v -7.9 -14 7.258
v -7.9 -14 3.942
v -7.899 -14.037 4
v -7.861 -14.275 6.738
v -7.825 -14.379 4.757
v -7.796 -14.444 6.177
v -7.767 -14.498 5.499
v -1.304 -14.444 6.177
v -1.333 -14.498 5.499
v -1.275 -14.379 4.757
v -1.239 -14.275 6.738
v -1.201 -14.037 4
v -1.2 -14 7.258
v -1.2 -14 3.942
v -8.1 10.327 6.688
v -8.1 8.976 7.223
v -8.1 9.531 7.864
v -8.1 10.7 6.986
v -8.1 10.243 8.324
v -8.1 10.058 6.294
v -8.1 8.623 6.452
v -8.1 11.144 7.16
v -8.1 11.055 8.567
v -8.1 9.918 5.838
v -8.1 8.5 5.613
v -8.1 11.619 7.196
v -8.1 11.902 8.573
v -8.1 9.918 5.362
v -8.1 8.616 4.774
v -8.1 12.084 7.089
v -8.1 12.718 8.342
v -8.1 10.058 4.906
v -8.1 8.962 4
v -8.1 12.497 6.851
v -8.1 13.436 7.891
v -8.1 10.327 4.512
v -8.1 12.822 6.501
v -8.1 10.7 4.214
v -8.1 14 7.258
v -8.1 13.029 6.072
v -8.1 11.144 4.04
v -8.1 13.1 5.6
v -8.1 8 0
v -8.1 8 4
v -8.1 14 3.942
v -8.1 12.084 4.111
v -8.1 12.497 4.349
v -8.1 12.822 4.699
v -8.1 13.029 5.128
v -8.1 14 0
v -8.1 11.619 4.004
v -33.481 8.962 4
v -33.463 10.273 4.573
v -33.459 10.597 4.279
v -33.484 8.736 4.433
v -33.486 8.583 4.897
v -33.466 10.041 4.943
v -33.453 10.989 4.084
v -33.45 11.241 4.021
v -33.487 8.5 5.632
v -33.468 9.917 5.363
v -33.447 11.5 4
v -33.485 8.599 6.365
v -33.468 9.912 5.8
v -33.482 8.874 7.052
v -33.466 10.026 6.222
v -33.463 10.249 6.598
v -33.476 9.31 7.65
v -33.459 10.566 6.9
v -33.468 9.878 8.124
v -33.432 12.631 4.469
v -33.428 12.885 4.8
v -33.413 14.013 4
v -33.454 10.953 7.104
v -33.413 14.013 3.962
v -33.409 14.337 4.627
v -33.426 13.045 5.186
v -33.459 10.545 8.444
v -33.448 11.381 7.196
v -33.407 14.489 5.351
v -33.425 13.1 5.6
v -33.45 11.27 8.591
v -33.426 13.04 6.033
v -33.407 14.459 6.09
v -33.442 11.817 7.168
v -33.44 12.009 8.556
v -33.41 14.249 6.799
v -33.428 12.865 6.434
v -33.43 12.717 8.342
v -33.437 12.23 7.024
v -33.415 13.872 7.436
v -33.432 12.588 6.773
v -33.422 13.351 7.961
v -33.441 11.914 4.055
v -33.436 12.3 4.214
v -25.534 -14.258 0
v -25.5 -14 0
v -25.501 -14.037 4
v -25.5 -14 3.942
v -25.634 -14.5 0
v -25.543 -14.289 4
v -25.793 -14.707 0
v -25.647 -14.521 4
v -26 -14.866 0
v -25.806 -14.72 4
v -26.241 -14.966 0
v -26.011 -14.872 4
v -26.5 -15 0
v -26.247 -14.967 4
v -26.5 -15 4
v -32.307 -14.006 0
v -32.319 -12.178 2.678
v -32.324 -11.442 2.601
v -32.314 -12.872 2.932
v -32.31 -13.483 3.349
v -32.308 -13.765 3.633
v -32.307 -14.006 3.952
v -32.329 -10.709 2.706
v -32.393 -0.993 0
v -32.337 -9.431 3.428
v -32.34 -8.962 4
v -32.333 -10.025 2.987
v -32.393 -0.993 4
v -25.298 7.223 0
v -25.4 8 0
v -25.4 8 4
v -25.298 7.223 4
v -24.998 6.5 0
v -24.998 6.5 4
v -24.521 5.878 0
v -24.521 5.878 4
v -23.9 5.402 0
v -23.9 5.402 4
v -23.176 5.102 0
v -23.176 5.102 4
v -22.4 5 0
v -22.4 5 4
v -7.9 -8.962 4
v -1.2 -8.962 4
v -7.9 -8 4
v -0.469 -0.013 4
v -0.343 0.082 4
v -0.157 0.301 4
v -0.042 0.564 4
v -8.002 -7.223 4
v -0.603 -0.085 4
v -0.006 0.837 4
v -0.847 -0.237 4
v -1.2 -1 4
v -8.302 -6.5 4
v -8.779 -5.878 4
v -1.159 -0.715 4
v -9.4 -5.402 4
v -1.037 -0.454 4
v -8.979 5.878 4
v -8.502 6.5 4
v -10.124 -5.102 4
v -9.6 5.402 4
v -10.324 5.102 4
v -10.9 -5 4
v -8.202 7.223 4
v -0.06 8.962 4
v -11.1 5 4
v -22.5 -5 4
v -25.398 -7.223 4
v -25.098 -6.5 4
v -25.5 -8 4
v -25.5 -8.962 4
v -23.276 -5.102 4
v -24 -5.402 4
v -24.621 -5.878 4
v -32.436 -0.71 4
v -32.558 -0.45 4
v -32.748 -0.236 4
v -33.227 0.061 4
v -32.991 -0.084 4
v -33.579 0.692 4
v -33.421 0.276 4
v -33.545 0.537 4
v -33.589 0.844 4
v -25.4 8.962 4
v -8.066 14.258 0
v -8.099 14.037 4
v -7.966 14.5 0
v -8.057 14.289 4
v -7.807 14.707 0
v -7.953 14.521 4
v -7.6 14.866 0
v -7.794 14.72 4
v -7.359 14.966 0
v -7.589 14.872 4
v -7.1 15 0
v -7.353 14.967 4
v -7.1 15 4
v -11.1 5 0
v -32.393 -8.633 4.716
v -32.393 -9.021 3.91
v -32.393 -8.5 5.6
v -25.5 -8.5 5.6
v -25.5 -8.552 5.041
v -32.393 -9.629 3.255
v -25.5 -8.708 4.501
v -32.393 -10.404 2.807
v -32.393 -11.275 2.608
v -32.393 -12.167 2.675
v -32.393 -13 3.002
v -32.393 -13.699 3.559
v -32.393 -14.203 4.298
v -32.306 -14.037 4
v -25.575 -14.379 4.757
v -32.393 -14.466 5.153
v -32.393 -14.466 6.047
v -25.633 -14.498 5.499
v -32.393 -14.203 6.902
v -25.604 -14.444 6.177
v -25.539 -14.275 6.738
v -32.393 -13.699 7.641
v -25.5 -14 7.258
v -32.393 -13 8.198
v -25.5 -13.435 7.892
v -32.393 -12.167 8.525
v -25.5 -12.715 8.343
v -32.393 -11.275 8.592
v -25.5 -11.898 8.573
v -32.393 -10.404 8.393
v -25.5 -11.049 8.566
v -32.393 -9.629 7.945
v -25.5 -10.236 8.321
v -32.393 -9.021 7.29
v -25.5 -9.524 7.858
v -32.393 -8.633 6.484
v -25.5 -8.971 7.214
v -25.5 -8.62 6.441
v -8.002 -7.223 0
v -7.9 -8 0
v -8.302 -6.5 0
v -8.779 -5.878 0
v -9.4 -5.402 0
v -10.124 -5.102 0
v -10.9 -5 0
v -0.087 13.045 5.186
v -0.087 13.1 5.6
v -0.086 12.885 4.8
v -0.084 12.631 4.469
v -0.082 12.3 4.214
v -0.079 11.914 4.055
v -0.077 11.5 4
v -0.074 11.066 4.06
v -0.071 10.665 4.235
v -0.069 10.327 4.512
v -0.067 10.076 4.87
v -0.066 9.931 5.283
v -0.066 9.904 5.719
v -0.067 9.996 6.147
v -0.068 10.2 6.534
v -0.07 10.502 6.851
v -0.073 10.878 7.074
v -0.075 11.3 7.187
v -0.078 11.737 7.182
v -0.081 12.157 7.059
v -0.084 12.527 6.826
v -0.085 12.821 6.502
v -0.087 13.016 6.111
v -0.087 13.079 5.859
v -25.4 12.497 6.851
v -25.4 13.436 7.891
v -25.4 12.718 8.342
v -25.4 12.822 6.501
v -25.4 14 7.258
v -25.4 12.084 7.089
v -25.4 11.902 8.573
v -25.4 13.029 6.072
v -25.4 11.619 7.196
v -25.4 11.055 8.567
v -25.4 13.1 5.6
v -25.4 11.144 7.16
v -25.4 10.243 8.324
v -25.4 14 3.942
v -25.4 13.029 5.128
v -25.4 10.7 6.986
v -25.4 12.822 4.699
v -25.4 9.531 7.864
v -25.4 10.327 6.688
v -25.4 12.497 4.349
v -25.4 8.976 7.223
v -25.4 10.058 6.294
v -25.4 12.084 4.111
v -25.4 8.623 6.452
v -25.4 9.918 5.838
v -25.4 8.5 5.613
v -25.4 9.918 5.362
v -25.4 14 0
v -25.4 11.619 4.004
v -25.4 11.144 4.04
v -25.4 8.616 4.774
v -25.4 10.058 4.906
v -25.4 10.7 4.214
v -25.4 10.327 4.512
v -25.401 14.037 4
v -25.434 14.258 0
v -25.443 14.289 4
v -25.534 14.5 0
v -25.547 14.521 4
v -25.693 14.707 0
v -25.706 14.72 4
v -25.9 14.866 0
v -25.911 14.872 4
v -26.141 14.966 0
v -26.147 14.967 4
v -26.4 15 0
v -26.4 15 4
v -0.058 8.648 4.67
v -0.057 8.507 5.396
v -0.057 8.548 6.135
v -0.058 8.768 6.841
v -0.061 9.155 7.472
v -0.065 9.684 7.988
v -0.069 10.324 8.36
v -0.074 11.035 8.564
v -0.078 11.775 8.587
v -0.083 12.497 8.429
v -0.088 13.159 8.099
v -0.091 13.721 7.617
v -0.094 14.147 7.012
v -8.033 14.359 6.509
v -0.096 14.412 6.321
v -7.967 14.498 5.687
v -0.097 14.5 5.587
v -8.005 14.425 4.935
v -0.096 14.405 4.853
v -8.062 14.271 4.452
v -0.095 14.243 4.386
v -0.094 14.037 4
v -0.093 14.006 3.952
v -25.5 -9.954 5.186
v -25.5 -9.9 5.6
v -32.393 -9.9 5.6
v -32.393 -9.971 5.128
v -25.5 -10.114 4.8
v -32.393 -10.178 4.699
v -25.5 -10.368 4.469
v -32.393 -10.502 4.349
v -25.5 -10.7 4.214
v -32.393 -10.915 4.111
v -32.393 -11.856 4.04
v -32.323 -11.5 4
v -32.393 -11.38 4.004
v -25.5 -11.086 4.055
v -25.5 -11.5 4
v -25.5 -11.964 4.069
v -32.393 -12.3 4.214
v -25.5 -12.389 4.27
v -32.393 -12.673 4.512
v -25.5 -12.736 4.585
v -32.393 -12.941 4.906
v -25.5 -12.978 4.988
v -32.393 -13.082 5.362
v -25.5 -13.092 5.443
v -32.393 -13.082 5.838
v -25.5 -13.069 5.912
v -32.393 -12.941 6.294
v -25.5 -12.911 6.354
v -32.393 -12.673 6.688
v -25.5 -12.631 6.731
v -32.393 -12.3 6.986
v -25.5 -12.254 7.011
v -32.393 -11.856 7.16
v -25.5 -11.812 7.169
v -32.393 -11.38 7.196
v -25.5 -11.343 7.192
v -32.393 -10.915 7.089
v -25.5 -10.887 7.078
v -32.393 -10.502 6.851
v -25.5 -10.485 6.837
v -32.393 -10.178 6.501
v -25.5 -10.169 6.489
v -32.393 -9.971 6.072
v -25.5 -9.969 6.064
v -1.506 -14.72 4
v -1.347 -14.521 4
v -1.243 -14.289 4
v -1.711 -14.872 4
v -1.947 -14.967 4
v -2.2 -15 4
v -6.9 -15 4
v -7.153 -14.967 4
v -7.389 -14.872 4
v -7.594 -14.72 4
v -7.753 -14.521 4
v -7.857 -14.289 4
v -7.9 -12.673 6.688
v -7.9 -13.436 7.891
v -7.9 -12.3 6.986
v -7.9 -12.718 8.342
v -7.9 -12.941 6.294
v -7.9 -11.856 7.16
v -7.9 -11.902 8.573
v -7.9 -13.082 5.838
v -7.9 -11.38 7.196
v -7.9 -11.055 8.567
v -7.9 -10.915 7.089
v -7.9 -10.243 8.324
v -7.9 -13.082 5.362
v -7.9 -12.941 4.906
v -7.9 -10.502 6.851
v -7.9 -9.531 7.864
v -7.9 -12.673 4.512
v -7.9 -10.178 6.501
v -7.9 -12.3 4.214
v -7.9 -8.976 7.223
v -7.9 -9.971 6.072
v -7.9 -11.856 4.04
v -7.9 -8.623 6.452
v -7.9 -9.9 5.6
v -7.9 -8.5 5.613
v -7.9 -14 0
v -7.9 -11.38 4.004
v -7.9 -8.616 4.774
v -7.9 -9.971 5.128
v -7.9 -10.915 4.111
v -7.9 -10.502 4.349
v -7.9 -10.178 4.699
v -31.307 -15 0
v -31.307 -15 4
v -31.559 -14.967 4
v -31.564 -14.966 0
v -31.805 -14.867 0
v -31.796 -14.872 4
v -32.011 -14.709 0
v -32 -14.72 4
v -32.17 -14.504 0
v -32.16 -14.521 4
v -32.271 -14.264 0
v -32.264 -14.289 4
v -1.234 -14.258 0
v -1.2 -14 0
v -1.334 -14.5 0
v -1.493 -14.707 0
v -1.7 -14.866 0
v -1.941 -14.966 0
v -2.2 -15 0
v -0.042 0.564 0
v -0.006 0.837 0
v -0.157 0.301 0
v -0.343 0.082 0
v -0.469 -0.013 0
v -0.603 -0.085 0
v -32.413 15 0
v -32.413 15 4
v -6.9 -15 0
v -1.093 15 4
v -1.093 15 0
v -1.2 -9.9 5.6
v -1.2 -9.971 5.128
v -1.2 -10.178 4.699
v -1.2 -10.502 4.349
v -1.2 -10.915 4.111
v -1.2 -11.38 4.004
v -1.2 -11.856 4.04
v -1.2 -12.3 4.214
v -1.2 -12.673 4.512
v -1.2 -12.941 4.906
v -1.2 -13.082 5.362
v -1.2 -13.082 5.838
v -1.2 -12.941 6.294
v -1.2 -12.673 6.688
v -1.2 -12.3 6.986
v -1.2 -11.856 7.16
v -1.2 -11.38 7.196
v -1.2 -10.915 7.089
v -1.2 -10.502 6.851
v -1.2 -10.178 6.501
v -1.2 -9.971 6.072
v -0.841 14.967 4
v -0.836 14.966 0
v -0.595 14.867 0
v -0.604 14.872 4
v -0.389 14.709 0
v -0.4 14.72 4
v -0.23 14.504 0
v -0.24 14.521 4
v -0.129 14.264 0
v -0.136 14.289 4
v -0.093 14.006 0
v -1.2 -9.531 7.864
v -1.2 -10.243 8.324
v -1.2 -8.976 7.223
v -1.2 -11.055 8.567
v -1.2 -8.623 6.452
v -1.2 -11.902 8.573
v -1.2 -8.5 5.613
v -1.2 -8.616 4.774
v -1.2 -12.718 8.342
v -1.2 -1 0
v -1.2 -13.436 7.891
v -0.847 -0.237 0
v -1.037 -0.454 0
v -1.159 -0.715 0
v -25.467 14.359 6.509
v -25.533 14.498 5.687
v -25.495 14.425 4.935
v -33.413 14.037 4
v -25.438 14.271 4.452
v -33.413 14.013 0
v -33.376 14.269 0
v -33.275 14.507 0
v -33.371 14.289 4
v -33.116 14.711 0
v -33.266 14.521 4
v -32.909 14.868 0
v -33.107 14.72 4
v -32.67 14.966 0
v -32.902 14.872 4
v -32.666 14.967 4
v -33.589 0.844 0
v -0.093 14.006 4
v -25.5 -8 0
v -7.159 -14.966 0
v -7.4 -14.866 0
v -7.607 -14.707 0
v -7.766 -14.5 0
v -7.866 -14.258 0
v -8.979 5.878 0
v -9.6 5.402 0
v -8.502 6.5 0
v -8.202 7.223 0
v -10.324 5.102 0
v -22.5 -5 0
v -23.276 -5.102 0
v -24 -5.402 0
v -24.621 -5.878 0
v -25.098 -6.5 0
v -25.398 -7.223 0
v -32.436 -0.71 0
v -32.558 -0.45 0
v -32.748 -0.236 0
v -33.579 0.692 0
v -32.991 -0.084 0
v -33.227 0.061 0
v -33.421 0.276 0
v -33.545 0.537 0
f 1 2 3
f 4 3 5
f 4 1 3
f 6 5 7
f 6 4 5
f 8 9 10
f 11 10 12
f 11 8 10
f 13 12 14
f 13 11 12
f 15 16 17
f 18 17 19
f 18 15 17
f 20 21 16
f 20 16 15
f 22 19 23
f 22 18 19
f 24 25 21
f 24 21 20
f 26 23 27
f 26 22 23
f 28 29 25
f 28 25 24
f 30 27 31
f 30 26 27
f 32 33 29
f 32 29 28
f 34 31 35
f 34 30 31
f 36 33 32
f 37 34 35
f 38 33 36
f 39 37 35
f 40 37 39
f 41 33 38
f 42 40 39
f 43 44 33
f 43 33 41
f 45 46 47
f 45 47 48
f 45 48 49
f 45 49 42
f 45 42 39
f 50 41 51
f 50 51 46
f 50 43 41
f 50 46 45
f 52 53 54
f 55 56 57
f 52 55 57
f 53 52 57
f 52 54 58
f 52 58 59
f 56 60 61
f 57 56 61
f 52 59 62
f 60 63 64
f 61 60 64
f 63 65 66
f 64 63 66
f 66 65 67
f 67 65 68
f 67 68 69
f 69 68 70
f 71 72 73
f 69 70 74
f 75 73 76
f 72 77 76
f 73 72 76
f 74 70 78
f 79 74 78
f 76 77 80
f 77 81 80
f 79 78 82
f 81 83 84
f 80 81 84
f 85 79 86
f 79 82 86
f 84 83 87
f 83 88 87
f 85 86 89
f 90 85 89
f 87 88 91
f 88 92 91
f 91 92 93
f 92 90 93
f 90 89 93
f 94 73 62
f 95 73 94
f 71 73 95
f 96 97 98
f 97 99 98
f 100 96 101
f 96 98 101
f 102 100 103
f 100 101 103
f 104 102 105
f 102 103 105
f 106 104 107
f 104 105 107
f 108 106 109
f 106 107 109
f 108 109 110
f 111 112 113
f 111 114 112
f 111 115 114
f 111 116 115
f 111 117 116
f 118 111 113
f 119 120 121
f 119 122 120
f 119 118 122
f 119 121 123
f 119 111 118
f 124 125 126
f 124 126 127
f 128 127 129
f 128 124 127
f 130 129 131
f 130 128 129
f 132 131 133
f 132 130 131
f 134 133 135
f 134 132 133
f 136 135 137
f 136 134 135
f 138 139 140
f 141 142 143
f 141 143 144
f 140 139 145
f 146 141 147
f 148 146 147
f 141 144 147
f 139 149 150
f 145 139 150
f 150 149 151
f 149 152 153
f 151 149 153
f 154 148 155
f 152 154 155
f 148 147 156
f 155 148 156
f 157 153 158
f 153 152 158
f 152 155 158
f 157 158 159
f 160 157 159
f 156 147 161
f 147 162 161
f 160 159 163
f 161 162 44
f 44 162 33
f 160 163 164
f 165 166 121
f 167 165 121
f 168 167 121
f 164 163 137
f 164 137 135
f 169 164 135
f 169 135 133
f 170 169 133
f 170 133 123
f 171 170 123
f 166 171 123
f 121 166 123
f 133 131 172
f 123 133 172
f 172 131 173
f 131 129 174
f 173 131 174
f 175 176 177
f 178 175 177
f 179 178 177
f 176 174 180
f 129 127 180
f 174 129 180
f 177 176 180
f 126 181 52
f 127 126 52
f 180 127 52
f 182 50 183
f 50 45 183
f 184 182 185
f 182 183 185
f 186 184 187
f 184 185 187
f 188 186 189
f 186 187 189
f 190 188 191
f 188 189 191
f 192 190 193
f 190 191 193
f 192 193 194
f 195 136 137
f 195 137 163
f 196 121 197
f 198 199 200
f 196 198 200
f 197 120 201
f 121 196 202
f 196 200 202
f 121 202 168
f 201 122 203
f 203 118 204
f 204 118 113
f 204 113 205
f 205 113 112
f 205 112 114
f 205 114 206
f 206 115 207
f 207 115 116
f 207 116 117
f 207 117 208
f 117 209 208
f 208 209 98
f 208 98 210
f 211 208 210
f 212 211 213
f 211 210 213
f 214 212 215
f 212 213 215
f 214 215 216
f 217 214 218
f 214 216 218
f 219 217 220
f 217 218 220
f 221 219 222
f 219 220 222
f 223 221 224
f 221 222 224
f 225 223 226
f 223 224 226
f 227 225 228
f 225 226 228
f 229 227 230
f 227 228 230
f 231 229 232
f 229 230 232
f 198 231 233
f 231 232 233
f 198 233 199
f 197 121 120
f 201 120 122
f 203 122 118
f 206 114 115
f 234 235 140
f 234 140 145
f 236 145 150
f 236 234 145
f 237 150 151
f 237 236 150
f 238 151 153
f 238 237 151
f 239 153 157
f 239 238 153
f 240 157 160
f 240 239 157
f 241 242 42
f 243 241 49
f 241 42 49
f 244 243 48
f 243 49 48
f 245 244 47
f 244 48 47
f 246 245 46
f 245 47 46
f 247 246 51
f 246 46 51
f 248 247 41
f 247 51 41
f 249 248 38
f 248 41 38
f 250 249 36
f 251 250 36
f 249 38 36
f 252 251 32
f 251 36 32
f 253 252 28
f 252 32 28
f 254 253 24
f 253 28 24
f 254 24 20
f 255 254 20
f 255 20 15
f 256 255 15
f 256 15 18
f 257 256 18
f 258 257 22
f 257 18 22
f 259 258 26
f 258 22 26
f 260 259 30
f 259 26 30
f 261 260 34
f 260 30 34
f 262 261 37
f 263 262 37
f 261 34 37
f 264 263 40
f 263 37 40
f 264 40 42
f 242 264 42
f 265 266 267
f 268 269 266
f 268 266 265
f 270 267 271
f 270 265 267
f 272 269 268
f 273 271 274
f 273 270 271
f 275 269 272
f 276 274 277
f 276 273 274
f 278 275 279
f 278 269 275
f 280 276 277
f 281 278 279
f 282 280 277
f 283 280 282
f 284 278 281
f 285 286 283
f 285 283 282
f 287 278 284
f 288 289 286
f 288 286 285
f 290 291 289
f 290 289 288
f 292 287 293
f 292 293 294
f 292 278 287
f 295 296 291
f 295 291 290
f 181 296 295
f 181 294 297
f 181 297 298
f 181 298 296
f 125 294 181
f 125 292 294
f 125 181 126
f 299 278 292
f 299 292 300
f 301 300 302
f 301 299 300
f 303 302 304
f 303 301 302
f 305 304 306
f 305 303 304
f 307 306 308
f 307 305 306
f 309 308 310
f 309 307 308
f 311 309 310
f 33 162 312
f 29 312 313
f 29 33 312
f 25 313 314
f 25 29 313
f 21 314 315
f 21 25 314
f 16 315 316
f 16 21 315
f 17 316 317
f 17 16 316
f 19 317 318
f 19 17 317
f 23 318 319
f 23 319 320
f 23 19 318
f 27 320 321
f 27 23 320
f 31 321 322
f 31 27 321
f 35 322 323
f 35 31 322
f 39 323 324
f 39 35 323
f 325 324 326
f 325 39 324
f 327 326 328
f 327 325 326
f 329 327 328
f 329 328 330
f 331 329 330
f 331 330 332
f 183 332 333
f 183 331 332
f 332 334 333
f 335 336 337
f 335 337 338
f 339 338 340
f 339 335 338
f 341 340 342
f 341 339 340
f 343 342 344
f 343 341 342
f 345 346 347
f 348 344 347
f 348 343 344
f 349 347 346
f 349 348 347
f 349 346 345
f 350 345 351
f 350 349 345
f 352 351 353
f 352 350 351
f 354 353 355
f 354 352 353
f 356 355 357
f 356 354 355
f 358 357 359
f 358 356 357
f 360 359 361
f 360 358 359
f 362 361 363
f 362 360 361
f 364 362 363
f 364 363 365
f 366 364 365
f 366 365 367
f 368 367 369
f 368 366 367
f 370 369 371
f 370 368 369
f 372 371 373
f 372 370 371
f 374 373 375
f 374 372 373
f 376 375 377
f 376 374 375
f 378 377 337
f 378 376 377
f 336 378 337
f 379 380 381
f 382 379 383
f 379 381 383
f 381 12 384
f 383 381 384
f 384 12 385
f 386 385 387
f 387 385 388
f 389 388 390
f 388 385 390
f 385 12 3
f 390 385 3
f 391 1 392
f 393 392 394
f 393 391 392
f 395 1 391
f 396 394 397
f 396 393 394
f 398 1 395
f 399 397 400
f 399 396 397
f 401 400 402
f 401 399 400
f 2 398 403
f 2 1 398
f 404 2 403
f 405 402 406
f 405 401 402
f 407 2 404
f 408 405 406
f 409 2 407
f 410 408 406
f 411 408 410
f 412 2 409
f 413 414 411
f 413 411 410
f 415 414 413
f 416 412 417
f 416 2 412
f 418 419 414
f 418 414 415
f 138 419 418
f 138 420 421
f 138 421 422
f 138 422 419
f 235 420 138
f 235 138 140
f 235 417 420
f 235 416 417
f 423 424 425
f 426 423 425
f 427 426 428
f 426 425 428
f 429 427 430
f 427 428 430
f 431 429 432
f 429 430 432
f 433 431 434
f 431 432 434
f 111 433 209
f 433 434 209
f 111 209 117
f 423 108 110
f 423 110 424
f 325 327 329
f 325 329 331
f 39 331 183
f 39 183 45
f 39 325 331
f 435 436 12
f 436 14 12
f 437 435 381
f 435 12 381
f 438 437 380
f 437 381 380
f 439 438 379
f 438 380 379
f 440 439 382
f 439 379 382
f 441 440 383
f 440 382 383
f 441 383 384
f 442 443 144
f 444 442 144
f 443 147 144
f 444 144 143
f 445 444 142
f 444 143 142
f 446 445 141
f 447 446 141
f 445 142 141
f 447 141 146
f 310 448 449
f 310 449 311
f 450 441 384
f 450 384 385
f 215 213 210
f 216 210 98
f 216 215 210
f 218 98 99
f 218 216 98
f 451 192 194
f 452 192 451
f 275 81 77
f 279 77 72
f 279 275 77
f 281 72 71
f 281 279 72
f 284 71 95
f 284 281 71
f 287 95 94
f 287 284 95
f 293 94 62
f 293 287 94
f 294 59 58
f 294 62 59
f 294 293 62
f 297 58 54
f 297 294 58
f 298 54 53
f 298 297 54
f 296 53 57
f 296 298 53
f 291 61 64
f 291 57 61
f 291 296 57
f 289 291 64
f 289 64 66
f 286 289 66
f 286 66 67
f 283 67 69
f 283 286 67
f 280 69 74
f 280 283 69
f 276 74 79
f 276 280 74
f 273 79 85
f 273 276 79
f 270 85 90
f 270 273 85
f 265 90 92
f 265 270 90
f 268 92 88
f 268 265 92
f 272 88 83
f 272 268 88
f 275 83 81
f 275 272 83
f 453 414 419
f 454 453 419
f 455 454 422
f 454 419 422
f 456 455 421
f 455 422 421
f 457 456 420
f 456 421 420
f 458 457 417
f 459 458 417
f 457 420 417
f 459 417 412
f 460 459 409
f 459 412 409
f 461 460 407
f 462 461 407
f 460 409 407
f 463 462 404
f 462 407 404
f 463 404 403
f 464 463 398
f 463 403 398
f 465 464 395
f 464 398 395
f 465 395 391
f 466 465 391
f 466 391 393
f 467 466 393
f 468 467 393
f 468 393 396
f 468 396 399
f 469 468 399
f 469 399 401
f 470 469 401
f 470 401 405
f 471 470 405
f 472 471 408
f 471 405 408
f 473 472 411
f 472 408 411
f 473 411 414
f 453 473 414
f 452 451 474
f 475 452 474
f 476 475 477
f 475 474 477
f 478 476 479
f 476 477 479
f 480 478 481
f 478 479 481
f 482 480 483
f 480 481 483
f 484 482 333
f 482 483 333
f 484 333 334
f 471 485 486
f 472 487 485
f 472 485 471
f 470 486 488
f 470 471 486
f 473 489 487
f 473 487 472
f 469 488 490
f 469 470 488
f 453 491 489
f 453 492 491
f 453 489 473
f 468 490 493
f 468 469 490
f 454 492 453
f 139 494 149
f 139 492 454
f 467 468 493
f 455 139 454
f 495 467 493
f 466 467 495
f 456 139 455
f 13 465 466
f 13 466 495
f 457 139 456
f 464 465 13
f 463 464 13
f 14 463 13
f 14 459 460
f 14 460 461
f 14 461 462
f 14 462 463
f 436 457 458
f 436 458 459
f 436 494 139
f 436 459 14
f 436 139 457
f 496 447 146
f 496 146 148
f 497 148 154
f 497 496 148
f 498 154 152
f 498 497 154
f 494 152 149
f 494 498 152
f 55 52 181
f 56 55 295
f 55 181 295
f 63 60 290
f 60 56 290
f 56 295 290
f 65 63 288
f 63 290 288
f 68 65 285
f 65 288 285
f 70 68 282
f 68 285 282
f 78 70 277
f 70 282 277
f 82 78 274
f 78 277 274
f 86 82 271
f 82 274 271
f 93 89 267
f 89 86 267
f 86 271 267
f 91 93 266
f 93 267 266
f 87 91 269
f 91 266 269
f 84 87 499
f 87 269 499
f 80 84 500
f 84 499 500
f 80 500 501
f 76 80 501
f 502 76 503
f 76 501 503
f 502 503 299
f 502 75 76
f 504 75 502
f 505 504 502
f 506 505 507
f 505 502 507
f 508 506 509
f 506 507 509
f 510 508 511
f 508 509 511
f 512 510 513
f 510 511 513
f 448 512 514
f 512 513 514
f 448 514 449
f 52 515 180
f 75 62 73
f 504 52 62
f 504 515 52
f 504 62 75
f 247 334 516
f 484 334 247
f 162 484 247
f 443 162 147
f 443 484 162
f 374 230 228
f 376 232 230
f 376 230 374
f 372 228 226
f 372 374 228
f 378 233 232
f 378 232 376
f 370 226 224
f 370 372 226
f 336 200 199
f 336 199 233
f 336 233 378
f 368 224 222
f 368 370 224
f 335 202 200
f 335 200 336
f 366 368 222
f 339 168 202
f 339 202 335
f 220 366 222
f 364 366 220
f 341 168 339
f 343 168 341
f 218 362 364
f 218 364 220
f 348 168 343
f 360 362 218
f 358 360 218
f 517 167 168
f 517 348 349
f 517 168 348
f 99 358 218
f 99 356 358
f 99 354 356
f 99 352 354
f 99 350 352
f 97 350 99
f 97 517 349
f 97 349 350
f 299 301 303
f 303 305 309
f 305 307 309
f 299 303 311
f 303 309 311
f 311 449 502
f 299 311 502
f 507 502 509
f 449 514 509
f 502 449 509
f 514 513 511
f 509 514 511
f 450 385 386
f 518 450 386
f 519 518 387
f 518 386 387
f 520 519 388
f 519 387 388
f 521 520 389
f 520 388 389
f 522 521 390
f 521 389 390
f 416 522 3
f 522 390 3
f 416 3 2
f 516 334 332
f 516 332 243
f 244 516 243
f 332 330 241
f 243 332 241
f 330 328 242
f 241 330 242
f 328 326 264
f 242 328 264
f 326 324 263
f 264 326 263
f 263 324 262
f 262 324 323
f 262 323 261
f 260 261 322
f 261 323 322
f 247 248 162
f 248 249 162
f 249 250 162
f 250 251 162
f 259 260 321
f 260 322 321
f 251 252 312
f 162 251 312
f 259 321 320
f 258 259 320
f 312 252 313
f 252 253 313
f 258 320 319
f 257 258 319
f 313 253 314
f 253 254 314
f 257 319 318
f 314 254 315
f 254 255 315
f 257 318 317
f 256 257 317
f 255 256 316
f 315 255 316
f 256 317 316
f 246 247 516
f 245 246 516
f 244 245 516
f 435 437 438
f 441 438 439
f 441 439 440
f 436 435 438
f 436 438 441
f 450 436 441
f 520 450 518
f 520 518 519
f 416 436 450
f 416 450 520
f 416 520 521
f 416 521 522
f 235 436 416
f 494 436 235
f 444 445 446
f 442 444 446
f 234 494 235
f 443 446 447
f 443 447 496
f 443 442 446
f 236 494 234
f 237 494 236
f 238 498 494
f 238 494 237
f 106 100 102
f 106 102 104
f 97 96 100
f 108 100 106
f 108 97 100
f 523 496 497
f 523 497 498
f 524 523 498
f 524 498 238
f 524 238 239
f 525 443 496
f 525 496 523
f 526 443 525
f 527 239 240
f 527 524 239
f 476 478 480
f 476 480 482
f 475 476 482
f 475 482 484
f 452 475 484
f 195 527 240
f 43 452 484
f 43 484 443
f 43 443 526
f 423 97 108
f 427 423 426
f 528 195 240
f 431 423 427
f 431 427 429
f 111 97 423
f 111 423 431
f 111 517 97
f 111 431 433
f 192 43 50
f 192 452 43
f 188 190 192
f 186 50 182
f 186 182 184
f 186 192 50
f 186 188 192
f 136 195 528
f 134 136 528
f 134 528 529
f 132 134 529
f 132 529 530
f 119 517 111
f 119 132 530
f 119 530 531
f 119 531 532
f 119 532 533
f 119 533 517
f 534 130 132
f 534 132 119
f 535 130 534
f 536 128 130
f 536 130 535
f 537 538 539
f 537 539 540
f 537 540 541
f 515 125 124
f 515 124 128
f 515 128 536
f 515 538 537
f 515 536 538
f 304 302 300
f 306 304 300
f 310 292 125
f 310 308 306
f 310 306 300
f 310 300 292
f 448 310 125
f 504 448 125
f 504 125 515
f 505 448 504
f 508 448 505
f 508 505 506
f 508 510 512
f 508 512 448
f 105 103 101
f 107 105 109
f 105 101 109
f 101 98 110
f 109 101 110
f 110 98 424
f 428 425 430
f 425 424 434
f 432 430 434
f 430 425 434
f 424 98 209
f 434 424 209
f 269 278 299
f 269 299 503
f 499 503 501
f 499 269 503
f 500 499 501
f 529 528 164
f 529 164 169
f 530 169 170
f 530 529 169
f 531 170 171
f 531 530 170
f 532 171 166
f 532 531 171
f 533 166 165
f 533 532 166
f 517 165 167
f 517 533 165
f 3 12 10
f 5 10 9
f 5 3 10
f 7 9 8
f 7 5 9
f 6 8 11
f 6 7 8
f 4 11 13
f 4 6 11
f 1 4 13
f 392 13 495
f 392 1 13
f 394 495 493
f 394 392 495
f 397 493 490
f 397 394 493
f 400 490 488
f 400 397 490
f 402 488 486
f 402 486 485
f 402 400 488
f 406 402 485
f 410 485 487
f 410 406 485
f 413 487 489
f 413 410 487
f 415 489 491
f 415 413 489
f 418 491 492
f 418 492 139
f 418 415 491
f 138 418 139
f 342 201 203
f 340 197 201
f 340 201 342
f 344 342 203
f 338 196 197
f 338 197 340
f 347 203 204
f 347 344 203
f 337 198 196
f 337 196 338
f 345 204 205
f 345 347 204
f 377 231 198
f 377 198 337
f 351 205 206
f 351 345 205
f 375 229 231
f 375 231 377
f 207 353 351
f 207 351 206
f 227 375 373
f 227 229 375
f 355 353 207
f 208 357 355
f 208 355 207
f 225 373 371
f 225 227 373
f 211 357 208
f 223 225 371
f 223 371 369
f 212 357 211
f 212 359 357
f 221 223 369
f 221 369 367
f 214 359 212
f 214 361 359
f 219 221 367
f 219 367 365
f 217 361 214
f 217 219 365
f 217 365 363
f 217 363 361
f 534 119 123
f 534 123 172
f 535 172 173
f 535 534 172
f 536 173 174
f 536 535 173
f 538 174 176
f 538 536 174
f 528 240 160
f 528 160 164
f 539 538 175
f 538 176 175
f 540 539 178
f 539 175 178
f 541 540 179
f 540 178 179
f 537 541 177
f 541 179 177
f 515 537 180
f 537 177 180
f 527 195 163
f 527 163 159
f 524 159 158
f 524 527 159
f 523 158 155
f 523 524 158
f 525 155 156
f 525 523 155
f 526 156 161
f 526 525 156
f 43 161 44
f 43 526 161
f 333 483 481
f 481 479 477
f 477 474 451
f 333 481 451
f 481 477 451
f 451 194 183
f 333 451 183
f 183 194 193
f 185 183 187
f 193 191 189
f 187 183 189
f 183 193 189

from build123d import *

# Parameters (mm, degrees)
BOSS_EXTRUDE1_DEPTH             = 4
FILLET1_R                       = 1
BOSS_EXTRUDE3_REACH             = 25.017
SKETCH5_R                       = 3
SKETCH5_R_2                     = 1.6
BOSS_EXTRUDE3_DIRECTION_2_REACH = 25.017
CUT_EXTRUDE2_START              = -8.6000001
CUT_EXTRUDE2_DEPTH              = 6.0000001


# Read off the part's stored shape, not the designer's step: Cut-Extrude2
with BuildPart() as part:
    # Sketch1 → Boss-Extrude1 (new body)
    with BuildSketch(Plane.XY):
        with BuildLine():
            Line((-25.399999997, 14.999666663), (-25.399999997, 7.999666663))
            ThreePointArc((-25.399999997, 7.999666663), (-24.52132034, 5.878346319), (-22.399999997, 4.999666663))
            Line((-22.399999997, 4.999666663), (-11.099999997, 4.999666663))
            ThreePointArc((-11.099999997, 4.999666663), (-8.978679653, 5.878346319), (-8.099999997, 7.999666663))
            Line((-8.099999997, 7.999666663), (-8.099999997, 14.999666663))
            Line((-8.099999997, 14.999666663), (-0.099999997, 14.999666663))
            Line((-0.099999997, 14.999666663), (0, 0))
            Line((0, 0), (-0.2, 0))
            ThreePointArc((-0.2, 0), (-0.907106781, -0.292893219), (-1.2, -1))
            Line((-1.2, -1), (-1.2, -14.999666663))
            Line((-1.2, -14.999666663), (-7.900000003, -14.999666663))
            Line((-7.900000003, -14.999666663), (-7.900000003, -7.999666663))
            ThreePointArc((-7.900000003, -7.999666663), (-8.77867966, -5.878346319), (-10.900000003, -4.999666663))
            Line((-10.900000003, -4.999666663), (-22.500000003, -4.999666663))
            ThreePointArc((-22.500000003, -4.999666663), (-24.621320347, -5.878346319), (-25.500000003, -7.999666663))
            Line((-25.500000003, -7.999666663), (-25.500000003, -14.999666663))
            Line((-25.500000003, -14.999666663), (-32.300000003, -14.999666663))
            Line((-32.300000003, -14.999666663), (-32.39337598, -0.993276115))
            ThreePointArc((-32.39337598, -0.993276115), (-32.688706434, -0.290384923), (-33.39363154, 5.7325e-05))
            Line((-33.39363154, 5.7325e-05), (-33.6, 0))
            Line((-33.6, 0), (-33.399999997, 14.999666663))
            Line((-33.399999997, 14.999666663), (-25.399999997, 14.999666663))
        make_face()
    extrude(amount=BOSS_EXTRUDE1_DEPTH)

    # Fillet1
    fillet1_edges = [part.edges().sort_by_distance(p)[0] for p in [
        (-7.900000003, -14.999666663, 2),
        (-25.500000003, -14.999666663, 2),
        (-0.099999997, 14.999666663, 2),
        (-8.099999997, 14.999666663, 2),
        (-25.399999997, 14.999666663, 2),
        (-33.399999997, 14.999666663, 2),
        (-32.300000003, -14.999666663, 2),
        (-33.6, 0, 2),
        (-1.2, -14.999666663, 2),
        (0, 0, 2),
    ]]
    fillet(fillet1_edges, radius=FILLET1_R)

    # Boss-Extrude3: up to this plane
    boss_extrude3_end = Plane(origin=(-33.399999997, 14.999666663, 4), z_dir=(0.9999111190085467, -0.013332444752411323, 0))
    # Sketch5 → Boss-Extrude3 (add, up to the surface)
    with BuildSketch(Plane.ZY.offset(16.999999997), mode=Mode.PRIVATE) as boss_extrude3_sk1:
        with Locations(Location((5.6, 11.499666663, 0), (0, 0, 123.557309762))):
            Circle(SKETCH5_R)
        with Locations(Location((5.6, 11.499666663, 0), (0, 0, 90))):
            Circle(SKETCH5_R_2, mode=Mode.SUBTRACT)
    boss_extrude3_tool1 = split(extrude(boss_extrude3_sk1.sketch, amount=BOSS_EXTRUDE3_REACH, mode=Mode.PRIVATE), bisect_by=boss_extrude3_end, keep=Keep.BOTH, mode=Mode.PRIVATE)
    add(boss_extrude3_tool1.solids().sort_by_distance((-17, 9.070377, 7.211408))[0])
    # Sketch5 → Boss-Extrude3 (add, up to the surface)
    with BuildSketch(Plane.ZY.offset(16.999999997), mode=Mode.PRIVATE) as boss_extrude3_sk2:
        with Locations(Location((5.6, -11.499666663, 0), (0, 0, 90))):
            Circle(SKETCH5_R)
        with Locations(Location((5.6, -11.499666663, 0), (0, 0, 90))):
            Circle(SKETCH5_R_2, mode=Mode.SUBTRACT)
    boss_extrude3_tool2 = split(extrude(boss_extrude3_sk2.sketch, amount=BOSS_EXTRUDE3_REACH, mode=Mode.PRIVATE), bisect_by=boss_extrude3_end, keep=Keep.BOTH, mode=Mode.PRIVATE)
    add(boss_extrude3_tool2.solids().sort_by_distance((-17, -14.414814, 5.6))[0])

    # Boss-Extrude3 direction 2: up to this plane
    boss_extrude3_direction_2_end = Plane(origin=(-0.099999997, 14.999666663, 4), z_dir=(-0.9999777775323199, -0.006666666447507326, 0))
    # Sketch5 → Boss-Extrude3 direction 2 (add, up to the surface)
    with BuildSketch(Plane.ZY.offset(16.999999997), mode=Mode.PRIVATE) as boss_extrude3_direction_2_sk1:
        with Locations(Location((5.6, 11.499666663, 0), (0, 0, 123.557309762))):
            Circle(SKETCH5_R)
        with Locations(Location((5.6, 11.499666663, 0), (0, 0, 90))):
            Circle(SKETCH5_R_2, mode=Mode.SUBTRACT)
    boss_extrude3_direction_2_tool1 = split(extrude(boss_extrude3_direction_2_sk1.sketch, amount=-BOSS_EXTRUDE3_DIRECTION_2_REACH, mode=Mode.PRIVATE), bisect_by=boss_extrude3_direction_2_end, keep=Keep.BOTH, mode=Mode.PRIVATE)
    add(boss_extrude3_direction_2_tool1.solids().sort_by_distance((-17, 9.070377, 7.211408))[0])
    # Sketch5 → Boss-Extrude3 direction 2 (add, up to the surface)
    with BuildSketch(Plane.ZY.offset(16.999999997), mode=Mode.PRIVATE) as boss_extrude3_direction_2_sk2:
        with Locations(Location((5.6, -11.499666663, 0), (0, 0, 90))):
            Circle(SKETCH5_R)
        with Locations(Location((5.6, -11.499666663, 0), (0, 0, 90))):
            Circle(SKETCH5_R_2, mode=Mode.SUBTRACT)
    boss_extrude3_direction_2_tool2 = split(extrude(boss_extrude3_direction_2_sk2.sketch, amount=-BOSS_EXTRUDE3_DIRECTION_2_REACH, mode=Mode.PRIVATE), bisect_by=boss_extrude3_direction_2_end, keep=Keep.BOTH, mode=Mode.PRIVATE)
    add(boss_extrude3_direction_2_tool2.solids().sort_by_distance((-17, -14.414814, 5.6))[0])

    # Cut-Extrude2 outline → Cut-Extrude2 (cut)
    with BuildSketch(Plane(origin=(0, 0, 0), x_dir=(-1, 0, 0), z_dir=(0, 0, -1)).offset(CUT_EXTRUDE2_START)):
        Polygon((37.39337598, -0.993276115), (32.39337598, -0.993276115), (32.39337598, -8.499666663), (32.39337598, -14.499666663), (32.39337598, -14.999666663), (37.39337598, -14.999666663), align=None)
        with BuildLine():
            Line((26.399999997, 14.999666663), (7.099999997, 14.999666663))
            ThreePointArc((7.099999997, 14.999666663), (7.807106778, 14.706773444), (8.099999997, 13.999666663))
            Line((8.099999997, 13.999666663), (8.099999997, 7.999666663))
            ThreePointArc((8.099999997, 7.999666663), (8.978679653, 5.878346319), (11.099999997, 4.999666663))
            Line((11.099999997, 4.999666663), (22.399999997, 4.999666663))
            ThreePointArc((22.399999997, 4.999666663), (24.52132034, 5.878346319), (25.399999997, 7.999666663))
            Line((25.399999997, 7.999666663), (25.399999997, 13.999666663))
            ThreePointArc((25.399999997, 13.999666663), (25.692893216, 14.706773444), (26.399999997, 14.999666663))
        make_face()
        with BuildLine():
            Line((1.2, -13.999666663), (1.2, -1))
            Line((1.2, -1), (-2.8, -1))
            Line((-2.8, -1), (-2.8, -14.999666663))
            Line((-2.8, -14.999666663), (2.2, -14.999666663))
            ThreePointArc((2.2, -14.999666663), (1.492893219, -14.706773444), (1.2, -13.999666663))
        make_face()
        with BuildLine():
            ThreePointArc((7.900000003, -13.999666663), (7.607106784, -14.706773444), (6.900000003, -14.999666663))
            Line((6.900000003, -14.999666663), (26.500000003, -14.999666663))
            ThreePointArc((26.500000003, -14.999666663), (25.792893222, -14.706773444), (25.500000003, -13.999666663))
            Line((25.500000003, -13.999666663), (25.500000003, -7.999666663))
            ThreePointArc((25.500000003, -7.999666663), (24.621320347, -5.878346319), (22.500000003, -4.999666663))
            Line((22.500000003, -4.999666663), (10.900000003, -4.999666663))
            ThreePointArc((10.900000003, -4.999666663), (8.77867966, -5.878346319), (7.900000003, -7.999666663))
            Line((7.900000003, -7.999666663), (7.900000003, -13.999666663))
        make_face()
    extrude(amount=CUT_EXTRUDE2_DEPTH, mode=Mode.SUBTRACT)


solid = part.part
